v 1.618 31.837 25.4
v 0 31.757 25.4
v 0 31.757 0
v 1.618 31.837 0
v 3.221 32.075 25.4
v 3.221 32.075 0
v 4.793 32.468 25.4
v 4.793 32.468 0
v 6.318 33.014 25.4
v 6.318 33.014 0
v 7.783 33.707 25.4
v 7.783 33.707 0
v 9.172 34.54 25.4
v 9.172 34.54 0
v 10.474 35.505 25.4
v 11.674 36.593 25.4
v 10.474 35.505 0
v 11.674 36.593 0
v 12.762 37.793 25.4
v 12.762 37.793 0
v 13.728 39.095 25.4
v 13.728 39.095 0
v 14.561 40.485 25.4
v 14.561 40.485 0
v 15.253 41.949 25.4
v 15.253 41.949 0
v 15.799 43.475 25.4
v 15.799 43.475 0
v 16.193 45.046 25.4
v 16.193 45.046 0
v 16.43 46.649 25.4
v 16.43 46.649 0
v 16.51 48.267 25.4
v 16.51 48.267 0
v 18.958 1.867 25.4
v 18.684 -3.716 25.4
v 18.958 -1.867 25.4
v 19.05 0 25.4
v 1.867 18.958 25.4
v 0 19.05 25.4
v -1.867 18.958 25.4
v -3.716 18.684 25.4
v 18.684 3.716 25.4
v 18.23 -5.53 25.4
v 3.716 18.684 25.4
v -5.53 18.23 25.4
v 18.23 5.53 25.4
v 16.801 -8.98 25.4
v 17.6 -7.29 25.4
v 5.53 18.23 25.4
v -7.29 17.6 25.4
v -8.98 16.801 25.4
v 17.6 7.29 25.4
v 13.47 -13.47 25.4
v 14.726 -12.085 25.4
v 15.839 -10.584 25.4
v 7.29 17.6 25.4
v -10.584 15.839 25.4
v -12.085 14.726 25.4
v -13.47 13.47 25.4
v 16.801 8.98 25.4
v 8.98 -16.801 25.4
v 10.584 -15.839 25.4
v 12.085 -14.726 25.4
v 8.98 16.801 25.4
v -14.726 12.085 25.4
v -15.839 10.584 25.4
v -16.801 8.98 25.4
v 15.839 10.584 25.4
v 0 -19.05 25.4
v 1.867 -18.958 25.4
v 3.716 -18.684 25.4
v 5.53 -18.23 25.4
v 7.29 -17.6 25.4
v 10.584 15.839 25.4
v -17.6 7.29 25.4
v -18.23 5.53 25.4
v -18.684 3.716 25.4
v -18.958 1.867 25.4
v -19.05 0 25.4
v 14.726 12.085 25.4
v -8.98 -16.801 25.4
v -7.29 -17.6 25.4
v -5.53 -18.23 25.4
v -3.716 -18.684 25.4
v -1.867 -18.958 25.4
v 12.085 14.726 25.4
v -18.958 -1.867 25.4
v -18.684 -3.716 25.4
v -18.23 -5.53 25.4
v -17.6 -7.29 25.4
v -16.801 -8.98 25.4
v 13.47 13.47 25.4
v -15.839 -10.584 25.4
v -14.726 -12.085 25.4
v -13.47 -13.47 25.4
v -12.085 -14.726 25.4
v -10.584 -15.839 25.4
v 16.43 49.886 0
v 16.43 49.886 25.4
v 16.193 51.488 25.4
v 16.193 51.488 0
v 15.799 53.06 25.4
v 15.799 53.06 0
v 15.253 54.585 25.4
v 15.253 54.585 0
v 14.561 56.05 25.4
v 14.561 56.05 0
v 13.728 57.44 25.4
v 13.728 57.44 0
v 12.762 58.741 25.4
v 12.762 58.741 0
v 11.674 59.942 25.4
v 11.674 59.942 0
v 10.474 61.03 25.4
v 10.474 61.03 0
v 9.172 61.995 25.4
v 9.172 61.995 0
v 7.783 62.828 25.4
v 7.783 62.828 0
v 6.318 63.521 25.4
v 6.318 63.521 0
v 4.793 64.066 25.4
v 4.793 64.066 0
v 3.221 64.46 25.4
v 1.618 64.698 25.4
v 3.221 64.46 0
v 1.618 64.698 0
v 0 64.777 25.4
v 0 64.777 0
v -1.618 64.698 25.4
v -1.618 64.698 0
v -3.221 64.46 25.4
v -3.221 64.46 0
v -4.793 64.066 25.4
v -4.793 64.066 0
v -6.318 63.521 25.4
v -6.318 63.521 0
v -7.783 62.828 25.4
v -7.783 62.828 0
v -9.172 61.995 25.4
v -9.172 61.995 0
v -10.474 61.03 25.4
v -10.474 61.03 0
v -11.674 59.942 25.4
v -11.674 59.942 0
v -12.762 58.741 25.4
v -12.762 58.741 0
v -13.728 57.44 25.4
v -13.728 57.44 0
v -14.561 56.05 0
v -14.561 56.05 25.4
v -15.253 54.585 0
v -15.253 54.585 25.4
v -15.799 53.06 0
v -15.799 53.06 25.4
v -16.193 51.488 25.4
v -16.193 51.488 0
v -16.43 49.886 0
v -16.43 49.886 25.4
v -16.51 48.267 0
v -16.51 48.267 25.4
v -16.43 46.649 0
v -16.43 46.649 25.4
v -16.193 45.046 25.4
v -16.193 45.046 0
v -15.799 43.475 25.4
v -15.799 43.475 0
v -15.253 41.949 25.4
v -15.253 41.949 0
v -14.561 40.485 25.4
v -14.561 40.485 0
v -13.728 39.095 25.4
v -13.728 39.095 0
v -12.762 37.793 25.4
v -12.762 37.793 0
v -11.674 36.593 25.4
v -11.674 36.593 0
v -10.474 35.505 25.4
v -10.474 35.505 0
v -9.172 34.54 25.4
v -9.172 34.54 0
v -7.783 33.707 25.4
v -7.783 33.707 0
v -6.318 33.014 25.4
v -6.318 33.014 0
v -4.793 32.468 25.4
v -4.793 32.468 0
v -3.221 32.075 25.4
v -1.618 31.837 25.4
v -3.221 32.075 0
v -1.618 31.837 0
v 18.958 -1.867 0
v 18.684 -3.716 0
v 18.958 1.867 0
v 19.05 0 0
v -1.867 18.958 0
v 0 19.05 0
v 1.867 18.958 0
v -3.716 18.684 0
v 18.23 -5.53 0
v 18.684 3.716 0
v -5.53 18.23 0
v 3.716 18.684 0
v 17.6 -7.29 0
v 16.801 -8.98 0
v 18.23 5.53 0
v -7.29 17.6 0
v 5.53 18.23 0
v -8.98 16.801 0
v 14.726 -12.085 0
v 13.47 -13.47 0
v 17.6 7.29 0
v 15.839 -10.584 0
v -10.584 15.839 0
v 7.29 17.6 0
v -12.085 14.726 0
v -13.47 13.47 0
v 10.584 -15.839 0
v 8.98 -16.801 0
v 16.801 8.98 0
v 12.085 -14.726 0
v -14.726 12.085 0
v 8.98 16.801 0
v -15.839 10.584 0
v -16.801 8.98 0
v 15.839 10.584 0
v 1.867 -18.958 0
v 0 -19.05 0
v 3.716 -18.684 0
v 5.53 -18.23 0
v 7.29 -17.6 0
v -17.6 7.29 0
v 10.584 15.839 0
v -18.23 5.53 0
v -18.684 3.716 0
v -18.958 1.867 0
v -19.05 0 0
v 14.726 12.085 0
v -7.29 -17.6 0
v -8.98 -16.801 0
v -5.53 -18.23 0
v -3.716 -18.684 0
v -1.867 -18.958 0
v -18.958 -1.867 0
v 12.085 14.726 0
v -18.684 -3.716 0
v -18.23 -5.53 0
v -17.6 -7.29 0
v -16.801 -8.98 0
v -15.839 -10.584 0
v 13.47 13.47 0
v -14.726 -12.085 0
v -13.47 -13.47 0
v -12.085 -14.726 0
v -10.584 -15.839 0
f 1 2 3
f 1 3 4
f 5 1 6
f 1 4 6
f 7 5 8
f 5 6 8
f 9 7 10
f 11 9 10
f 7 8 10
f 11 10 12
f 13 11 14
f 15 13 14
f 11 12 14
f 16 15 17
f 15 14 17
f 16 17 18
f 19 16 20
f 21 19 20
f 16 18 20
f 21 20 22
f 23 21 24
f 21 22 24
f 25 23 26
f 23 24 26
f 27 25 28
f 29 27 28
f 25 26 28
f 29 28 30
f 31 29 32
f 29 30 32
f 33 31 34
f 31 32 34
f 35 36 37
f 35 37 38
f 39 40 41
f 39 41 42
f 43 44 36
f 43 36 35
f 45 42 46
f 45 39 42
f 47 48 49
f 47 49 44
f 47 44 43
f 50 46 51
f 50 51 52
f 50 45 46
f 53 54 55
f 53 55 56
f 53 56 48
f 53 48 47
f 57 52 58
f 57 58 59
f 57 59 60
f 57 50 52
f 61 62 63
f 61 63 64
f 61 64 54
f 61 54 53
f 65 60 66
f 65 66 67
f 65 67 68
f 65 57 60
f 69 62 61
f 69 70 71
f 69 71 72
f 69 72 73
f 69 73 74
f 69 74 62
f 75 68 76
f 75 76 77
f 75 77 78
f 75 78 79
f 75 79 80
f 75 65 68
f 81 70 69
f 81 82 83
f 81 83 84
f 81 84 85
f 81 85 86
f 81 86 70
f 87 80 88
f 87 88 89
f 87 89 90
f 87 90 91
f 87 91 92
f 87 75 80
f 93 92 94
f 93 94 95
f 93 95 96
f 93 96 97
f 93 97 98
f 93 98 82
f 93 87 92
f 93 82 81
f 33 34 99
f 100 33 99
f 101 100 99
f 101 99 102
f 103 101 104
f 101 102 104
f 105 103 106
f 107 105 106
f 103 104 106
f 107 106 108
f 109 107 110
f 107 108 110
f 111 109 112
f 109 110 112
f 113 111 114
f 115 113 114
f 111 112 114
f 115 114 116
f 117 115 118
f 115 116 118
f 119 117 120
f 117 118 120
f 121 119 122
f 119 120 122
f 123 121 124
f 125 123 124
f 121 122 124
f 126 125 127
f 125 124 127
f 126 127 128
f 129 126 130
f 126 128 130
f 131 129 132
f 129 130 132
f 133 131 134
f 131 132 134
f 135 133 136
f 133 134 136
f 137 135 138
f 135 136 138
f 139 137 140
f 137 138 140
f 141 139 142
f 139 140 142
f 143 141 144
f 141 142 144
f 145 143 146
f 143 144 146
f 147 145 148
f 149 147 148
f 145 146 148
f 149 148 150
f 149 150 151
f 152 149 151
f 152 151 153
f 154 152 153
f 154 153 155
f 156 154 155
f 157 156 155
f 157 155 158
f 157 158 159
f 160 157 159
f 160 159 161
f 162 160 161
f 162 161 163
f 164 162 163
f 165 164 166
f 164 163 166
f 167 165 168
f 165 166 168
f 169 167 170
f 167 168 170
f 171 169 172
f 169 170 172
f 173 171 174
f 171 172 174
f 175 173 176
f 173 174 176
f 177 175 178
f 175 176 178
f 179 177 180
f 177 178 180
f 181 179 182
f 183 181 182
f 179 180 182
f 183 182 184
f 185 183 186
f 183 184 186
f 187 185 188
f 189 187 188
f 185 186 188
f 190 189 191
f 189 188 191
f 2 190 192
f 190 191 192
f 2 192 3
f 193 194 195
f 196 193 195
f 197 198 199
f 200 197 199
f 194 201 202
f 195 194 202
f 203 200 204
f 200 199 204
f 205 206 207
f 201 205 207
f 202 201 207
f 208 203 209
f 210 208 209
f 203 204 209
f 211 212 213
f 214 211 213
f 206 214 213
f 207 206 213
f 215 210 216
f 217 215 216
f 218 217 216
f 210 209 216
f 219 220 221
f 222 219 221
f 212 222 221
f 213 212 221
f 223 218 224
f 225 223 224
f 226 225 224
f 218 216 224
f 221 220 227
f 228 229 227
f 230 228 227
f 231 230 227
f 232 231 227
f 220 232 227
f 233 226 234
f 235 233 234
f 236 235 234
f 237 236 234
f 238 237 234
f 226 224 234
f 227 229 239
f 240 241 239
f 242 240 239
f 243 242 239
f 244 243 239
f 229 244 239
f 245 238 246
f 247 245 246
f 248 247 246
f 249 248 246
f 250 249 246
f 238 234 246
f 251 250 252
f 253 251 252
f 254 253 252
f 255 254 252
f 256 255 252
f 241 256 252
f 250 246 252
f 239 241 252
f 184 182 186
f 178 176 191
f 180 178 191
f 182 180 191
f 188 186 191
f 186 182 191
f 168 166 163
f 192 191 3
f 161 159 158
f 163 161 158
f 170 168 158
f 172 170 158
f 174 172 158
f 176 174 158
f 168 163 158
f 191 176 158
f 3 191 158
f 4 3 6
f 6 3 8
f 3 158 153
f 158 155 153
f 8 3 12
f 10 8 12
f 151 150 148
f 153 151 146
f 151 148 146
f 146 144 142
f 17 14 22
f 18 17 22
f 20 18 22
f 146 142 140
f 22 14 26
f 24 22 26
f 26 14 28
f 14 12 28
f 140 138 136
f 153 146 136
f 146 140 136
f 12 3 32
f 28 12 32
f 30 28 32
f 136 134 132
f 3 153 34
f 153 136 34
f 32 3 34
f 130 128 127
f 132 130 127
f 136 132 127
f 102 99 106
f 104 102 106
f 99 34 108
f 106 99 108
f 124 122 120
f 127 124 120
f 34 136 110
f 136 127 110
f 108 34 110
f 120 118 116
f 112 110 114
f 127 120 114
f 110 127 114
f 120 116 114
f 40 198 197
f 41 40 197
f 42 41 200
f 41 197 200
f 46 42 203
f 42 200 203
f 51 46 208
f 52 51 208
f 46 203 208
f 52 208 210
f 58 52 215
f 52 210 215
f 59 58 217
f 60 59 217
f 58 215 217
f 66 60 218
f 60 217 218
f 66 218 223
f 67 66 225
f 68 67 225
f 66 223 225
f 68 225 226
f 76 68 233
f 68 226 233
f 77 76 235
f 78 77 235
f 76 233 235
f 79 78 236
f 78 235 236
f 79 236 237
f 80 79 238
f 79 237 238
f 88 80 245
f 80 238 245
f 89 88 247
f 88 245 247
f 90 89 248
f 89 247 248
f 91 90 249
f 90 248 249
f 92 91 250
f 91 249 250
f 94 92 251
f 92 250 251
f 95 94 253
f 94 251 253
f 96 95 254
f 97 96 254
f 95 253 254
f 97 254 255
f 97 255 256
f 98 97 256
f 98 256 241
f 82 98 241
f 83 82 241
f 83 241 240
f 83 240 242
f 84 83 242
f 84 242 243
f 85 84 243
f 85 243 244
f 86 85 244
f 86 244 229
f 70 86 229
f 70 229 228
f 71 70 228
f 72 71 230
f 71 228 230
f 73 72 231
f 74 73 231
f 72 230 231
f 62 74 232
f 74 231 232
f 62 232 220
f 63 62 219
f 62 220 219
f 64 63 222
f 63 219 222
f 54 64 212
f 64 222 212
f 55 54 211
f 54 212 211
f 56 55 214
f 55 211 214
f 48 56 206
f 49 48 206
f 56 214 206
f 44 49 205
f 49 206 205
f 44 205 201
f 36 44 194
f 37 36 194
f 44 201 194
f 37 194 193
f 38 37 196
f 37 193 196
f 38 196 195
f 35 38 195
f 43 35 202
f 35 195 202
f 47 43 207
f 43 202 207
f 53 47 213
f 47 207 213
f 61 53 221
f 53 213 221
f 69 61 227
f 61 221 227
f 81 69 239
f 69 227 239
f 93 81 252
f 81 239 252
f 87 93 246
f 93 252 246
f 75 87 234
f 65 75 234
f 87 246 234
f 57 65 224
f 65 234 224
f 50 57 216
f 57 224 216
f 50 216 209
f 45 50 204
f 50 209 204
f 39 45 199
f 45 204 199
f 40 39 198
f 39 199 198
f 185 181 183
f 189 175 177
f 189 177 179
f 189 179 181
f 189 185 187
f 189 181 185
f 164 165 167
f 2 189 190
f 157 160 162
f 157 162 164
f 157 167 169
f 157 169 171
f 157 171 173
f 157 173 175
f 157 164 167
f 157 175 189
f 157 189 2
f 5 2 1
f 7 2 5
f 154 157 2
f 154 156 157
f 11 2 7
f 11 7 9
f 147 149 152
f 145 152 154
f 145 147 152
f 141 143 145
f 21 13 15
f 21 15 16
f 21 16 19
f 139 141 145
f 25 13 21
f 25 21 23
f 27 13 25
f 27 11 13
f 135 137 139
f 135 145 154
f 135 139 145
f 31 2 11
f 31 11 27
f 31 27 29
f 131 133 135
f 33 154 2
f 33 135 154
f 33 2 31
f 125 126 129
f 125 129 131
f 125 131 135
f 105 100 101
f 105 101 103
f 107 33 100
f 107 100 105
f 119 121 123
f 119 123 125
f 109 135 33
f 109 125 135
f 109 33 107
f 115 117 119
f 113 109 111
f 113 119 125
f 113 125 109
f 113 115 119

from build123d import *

# Parameters (mm, degrees)
F1_DEPTH = 25.4


with BuildPart() as f1:
    # F0 (on Top) → F1 (new body)
    with BuildSketch(Plane.XY):
        with BuildLine():
            ThreePointArc((0, 19.05), (-13.470384, -13.470384), (19.05, 0))
            ThreePointArc((19.05, 0), (13.470384, 13.470384), (0, 19.05))
        make_face()
        with BuildLine():
            ThreePointArc((16.51, 48.267299), (-11.674333, 59.941632), (0, 31.757299))
            ThreePointArc((0, 31.757299), (11.674333, 36.592966), (16.51, 48.267299))
        make_face()
    extrude(amount=F1_DEPTH)


solid = f1.part
